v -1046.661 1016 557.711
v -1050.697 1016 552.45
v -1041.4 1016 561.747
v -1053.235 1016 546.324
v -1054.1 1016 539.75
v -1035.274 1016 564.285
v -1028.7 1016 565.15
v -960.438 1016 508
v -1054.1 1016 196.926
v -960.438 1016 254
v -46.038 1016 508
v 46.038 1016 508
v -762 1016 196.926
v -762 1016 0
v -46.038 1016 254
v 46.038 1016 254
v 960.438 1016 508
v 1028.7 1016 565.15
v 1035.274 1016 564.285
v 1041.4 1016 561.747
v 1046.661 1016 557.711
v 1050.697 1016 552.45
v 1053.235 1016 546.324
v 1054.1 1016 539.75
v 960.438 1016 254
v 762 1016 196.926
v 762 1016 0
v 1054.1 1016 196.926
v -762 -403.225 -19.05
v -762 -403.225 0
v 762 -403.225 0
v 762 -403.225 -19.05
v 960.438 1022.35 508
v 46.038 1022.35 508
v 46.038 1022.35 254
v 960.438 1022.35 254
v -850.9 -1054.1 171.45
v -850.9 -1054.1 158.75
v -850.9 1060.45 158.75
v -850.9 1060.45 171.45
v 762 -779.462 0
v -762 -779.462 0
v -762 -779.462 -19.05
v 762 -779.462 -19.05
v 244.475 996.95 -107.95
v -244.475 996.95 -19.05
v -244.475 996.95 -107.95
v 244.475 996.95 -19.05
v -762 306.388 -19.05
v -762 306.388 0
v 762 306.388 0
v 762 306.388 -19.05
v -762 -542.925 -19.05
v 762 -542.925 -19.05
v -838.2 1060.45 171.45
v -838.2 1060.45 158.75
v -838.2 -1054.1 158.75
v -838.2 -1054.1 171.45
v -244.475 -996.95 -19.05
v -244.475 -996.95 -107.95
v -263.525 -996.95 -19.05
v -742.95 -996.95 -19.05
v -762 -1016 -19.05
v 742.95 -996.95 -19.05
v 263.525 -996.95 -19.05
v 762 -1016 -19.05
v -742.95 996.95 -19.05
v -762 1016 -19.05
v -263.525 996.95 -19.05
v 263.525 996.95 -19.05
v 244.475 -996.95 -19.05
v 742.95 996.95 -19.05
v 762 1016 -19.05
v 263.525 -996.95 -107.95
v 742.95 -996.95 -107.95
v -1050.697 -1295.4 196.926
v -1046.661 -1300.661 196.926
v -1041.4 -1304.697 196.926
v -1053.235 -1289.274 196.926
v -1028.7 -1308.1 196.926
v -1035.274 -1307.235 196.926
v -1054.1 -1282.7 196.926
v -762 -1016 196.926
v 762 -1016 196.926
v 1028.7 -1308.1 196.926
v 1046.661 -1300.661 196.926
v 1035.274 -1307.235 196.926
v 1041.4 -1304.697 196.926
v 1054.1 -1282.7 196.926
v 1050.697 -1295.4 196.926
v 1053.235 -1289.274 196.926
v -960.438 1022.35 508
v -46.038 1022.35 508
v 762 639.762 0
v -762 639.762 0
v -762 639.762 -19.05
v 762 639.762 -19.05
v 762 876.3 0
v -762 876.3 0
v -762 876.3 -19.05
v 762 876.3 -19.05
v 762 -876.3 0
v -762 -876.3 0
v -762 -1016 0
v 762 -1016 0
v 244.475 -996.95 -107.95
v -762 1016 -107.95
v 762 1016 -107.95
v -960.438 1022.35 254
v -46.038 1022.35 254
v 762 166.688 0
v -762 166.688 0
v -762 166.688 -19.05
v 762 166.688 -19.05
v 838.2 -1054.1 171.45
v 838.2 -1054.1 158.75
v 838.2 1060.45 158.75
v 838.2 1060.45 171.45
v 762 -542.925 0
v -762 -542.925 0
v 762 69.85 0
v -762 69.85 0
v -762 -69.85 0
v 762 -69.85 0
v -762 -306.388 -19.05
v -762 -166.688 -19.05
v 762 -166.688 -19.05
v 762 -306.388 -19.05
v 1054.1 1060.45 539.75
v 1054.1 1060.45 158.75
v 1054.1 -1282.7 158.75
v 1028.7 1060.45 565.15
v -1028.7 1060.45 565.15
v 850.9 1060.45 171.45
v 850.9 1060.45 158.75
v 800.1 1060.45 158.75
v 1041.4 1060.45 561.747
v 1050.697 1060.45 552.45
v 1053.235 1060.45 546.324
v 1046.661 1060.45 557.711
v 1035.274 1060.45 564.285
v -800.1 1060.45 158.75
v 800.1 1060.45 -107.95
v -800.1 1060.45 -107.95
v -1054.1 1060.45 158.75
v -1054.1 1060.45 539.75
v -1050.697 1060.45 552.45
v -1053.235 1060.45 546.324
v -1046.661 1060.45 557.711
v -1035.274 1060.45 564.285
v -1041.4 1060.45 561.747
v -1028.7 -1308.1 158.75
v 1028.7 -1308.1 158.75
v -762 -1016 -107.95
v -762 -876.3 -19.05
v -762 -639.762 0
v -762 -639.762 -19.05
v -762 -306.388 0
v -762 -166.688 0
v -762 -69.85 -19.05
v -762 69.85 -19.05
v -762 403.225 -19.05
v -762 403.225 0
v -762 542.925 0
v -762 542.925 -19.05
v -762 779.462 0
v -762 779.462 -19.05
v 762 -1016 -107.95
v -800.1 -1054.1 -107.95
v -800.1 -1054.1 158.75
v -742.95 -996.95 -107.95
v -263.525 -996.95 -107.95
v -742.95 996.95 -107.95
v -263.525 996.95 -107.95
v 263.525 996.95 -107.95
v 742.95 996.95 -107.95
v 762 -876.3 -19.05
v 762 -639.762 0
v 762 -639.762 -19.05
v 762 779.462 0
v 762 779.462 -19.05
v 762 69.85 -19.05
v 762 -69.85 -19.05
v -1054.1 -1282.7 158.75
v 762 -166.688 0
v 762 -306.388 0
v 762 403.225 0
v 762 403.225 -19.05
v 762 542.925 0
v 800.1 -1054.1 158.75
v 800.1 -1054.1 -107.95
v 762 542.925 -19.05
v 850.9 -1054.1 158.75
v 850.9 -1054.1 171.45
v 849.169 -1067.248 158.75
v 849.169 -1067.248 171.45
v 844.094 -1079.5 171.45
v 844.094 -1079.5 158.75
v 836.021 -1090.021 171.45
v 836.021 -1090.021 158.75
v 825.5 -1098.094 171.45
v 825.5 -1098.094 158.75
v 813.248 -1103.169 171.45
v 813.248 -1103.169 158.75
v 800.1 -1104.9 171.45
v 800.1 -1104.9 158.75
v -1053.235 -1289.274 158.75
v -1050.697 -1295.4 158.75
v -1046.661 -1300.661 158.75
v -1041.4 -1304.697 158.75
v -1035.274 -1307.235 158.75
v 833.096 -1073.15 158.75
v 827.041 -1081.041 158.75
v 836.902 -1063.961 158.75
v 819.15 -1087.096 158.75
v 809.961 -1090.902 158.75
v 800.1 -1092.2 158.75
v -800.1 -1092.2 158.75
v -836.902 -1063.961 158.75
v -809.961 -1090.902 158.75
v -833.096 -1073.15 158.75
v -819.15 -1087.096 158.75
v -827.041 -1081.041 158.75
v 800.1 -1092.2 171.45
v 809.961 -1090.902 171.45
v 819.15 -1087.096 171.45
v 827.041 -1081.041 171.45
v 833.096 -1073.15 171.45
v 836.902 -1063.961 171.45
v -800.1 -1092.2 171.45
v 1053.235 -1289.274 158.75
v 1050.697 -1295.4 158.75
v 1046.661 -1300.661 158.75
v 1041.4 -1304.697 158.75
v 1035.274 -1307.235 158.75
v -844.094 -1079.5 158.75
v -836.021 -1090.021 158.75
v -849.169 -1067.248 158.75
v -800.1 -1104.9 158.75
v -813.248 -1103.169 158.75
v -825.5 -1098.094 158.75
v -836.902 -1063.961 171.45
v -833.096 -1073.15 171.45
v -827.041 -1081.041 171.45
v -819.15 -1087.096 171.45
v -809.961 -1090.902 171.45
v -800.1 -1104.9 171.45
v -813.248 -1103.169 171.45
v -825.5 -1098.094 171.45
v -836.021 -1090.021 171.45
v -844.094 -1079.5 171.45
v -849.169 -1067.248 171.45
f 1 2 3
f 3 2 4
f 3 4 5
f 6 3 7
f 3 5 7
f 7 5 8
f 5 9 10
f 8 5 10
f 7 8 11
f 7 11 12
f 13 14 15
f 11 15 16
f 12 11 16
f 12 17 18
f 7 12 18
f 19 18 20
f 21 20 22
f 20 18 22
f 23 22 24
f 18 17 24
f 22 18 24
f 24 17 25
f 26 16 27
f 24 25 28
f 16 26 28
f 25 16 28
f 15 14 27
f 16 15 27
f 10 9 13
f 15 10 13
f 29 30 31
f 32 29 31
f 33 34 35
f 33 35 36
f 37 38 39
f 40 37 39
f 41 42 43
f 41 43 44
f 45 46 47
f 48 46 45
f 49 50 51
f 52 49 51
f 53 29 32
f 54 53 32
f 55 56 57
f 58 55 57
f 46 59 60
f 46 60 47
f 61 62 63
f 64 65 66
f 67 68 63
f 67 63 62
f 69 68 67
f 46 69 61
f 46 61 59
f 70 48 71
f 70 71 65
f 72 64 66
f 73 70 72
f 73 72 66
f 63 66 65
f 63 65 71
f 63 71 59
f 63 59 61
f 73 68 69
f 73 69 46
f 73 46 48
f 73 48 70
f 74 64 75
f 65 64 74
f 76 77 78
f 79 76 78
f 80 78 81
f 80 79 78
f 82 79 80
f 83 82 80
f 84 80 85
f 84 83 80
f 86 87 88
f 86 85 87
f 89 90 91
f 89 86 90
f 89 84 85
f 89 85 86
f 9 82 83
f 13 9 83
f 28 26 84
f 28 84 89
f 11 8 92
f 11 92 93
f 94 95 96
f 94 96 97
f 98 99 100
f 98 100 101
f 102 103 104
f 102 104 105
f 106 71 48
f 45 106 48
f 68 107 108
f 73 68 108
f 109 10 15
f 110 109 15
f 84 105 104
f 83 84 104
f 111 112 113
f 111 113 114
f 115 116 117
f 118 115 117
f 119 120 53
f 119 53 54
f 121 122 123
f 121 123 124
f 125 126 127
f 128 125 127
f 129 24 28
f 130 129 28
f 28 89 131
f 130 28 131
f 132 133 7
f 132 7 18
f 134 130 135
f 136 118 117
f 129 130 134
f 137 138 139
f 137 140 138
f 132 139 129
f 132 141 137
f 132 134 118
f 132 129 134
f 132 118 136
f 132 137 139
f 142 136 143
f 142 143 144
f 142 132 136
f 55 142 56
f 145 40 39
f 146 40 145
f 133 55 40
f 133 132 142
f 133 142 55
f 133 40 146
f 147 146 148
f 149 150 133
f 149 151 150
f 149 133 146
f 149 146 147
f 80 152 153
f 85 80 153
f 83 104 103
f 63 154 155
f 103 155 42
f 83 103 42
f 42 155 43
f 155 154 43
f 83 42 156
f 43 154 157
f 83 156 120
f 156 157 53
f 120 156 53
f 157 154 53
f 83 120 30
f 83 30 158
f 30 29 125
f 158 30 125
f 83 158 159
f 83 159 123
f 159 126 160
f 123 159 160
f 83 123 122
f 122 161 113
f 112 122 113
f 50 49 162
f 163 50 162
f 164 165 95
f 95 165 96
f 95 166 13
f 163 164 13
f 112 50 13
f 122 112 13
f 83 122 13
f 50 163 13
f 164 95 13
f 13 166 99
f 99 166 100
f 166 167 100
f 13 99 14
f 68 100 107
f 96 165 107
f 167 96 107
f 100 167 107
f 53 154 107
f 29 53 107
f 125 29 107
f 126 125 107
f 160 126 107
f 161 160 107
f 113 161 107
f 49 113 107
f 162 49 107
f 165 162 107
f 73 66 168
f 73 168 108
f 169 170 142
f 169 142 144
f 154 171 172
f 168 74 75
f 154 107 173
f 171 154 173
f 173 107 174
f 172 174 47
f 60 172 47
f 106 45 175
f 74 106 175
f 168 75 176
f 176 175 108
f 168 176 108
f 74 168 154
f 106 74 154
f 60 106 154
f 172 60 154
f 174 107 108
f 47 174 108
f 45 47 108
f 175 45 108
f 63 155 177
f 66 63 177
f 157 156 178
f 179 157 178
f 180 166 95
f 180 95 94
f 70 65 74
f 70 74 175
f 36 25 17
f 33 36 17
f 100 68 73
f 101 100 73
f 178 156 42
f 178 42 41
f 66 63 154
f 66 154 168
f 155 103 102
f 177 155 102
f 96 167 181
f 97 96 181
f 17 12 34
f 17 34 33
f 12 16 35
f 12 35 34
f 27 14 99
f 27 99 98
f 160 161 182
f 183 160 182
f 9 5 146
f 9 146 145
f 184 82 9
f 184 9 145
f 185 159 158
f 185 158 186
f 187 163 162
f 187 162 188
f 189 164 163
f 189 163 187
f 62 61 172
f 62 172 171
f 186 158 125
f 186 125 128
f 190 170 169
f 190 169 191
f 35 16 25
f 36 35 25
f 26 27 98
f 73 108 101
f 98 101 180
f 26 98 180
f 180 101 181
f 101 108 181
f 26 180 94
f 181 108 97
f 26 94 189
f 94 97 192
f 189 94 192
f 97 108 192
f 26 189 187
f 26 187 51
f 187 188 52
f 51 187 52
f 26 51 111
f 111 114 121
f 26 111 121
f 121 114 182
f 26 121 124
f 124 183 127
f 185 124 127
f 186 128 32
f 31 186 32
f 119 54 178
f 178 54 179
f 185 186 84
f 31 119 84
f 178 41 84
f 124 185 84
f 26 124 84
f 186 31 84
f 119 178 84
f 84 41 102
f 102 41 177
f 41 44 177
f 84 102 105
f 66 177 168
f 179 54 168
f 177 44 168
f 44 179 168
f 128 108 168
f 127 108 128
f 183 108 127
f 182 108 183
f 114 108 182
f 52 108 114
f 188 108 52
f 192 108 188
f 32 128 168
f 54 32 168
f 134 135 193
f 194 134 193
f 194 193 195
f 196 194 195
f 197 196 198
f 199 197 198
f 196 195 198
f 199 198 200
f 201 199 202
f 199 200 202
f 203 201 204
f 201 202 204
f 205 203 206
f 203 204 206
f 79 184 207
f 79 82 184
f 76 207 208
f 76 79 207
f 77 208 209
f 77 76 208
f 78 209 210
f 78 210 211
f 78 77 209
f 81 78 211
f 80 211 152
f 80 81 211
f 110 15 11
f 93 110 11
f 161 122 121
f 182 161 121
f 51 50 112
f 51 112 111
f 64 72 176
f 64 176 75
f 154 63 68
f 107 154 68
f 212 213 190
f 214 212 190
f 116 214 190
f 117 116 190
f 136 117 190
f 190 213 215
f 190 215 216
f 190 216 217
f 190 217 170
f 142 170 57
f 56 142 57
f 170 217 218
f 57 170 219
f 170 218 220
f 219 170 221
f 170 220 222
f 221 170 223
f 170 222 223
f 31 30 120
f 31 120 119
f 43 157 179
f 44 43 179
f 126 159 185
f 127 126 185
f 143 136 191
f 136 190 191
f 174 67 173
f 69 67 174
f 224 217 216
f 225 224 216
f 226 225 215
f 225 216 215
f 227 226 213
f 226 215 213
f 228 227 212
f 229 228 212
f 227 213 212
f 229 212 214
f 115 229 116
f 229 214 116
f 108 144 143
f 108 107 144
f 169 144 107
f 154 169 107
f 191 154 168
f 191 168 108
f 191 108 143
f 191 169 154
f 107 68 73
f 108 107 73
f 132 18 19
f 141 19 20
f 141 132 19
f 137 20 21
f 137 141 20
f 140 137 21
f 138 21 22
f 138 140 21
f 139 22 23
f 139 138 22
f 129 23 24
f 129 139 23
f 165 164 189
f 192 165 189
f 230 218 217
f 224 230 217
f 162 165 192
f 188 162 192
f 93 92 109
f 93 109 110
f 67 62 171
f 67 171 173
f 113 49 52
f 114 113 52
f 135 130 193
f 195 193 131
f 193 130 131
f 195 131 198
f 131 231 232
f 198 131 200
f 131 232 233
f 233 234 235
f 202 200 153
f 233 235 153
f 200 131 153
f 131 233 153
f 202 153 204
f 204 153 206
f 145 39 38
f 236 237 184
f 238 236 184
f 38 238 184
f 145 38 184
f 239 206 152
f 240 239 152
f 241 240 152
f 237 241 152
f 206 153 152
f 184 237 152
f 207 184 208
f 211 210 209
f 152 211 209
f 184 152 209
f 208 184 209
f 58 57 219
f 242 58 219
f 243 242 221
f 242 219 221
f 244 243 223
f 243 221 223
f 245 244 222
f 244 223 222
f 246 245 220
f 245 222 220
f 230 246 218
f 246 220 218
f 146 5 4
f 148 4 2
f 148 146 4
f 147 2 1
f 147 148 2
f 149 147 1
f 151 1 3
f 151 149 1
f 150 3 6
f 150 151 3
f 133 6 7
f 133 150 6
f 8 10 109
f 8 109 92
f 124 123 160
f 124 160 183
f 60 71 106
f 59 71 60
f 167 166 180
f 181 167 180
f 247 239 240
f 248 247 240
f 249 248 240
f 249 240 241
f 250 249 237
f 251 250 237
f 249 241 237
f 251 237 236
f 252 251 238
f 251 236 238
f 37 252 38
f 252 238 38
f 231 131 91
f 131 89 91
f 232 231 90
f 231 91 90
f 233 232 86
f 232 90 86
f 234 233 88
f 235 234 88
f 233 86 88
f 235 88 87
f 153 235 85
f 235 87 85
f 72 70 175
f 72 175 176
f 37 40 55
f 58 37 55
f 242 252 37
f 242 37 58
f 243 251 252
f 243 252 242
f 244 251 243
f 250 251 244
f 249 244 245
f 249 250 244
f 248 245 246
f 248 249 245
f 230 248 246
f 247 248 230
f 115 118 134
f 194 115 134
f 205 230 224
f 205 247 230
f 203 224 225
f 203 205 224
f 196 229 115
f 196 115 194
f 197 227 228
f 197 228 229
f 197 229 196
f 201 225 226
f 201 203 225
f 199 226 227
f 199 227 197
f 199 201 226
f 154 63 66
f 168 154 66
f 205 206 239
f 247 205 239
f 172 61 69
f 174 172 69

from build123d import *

# Parameters (mm, degrees)
F0_W          = 1600.2
F0_H          = 2108.2
F0_W_2        = 1524
F0_H_2        = 2032
F1_DEPTH      = 196.85
F1_DEPTH_BACK = 107.95
F2_W          = 1524
F2_H          = 2032
F2_W_2        = 19.05
F2_H_2        = 1993.9
F3_DEPTH      = 107.95
F4_DEPTH      = 19.05
F5_W          = 1524
F5_H          = 139.7
F6_DEPTH      = 19.05
F7_W          = 254
F7_H          = 38.1
F8_DEPTH      = 368.3
F10_DEPTH     = 196.9262
F11_DEPTH     = 158.75
F12_DEPTH     = 38.1
F13_R         = 25.4
F14_R         = 25.4
F15_W         = 914.4
F15_H         = 254
F16_DEPTH     = 44.45
F17_DEPTH     = 6.35
F18_DEPTH     = 6.35
F20_DEPTH     = 12.7


with BuildPart() as f1:
    # F0 (on Top) → F1 (new body, two sides)
    with BuildSketch(Plane.XY) as f1_sk:
        Rectangle(F0_W, F0_H)
        Rectangle(F0_W_2, F0_H_2, mode=Mode.SUBTRACT)
    extrude(amount=F1_DEPTH)
    extrude(f1_sk.sketch, amount=-F1_DEPTH_BACK)

    # F7 (on face) → F8 (join)
    with BuildSketch(Plane.XY.offset(196.85)):
        with Locations((927.1, 1035.05)):
            Rectangle(F7_W, F7_H)
        with Locations((-927.1, 1035.05)):
            Rectangle(F7_W, F7_H)
        Polygon((800.1, 1054.1), (-800.1, 1054.1), (-800.1, 1016), (-762, 1016), (762, 1016), (800.1, 1016), align=None)
    extrude(amount=F8_DEPTH)



with BuildPart() as f3:
    # F2 (on Top) → F3 (new body)
    with BuildSketch(Plane.XY):
        Rectangle(F2_W, F2_H)
        Polygon((742.95, 996.95), (742.95, -996.95), (263.525, -996.95), (244.475, -996.95), (-244.475, -996.95), (-263.525, -996.95), (-742.95, -996.95), (-742.95, 996.95), (-263.525, 996.95), (-244.475, 996.95), (244.475, 996.95), (263.525, 996.95), align=None, mode=Mode.SUBTRACT)
        with Locations((-254, 0)):
            Rectangle(F2_W_2, F2_H_2)
        with Locations((254, 0)):
            Rectangle(F2_W_2, F2_H_2)
    extrude(amount=-F3_DEPTH)

    # F4 (cut): a face of the model
    f4_faces = [f3.faces().sort_by_distance(p)[0] for p in [
        (0, -1013.46, 0),
    ]]
    extrude(f4_faces, amount=-F4_DEPTH, mode=Mode.SUBTRACT)


with BuildPart() as f6:
    # F5 (on Top) → F6 (new body)
    with BuildSketch(Plane.XY):
        with Locations((0, 946.15)):
            Rectangle(F5_W, F5_H)
    extrude(amount=-F6_DEPTH)


with BuildPart() as f6b:
    # F5 (on Top) → F6, piece 2 (new body)
    with BuildSketch(Plane.XY):
        with Locations((0, 709.6125)):
            Rectangle(F5_W, F5_H)
    extrude(amount=-F6_DEPTH)


with BuildPart() as f6c:
    # F5 (on Top) → F6, piece 3 (new body)
    with BuildSketch(Plane.XY):
        with Locations((0, 473.075)):
            Rectangle(F5_W, F5_H)
    extrude(amount=-F6_DEPTH)


with BuildPart() as f6d:
    # F5 (on Top) → F6, piece 4 (new body)
    with BuildSketch(Plane.XY):
        with Locations((0, 236.5375)):
            Rectangle(F5_W, F5_H)
    extrude(amount=-F6_DEPTH)


with BuildPart() as f6e:
    # F5 (on Top) → F6, piece 5 (new body)
    with BuildSketch(Plane.XY):
        Rectangle(F5_W, F5_H)
    extrude(amount=-F6_DEPTH)


with BuildPart() as f6f:
    # F5 (on Top) → F6, piece 6 (new body)
    with BuildSketch(Plane.XY):
        with Locations((0, -236.5375)):
            Rectangle(F5_W, F5_H)
    extrude(amount=-F6_DEPTH)


with BuildPart() as f6g:
    # F5 (on Top) → F6, piece 7 (new body)
    with BuildSketch(Plane.XY):
        with Locations((0, -473.075)):
            Rectangle(F5_W, F5_H)
    extrude(amount=-F6_DEPTH)


with BuildPart() as f6h:
    # F5 (on Top) → F6, piece 8 (new body)
    with BuildSketch(Plane.XY):
        with Locations((0, -709.6125)):
            Rectangle(F5_W, F5_H)
    extrude(amount=-F6_DEPTH)


with BuildPart() as f6i:
    # F5 (on Top) → F6, piece 9 (new body)
    with BuildSketch(Plane.XY):
        with Locations((0, -946.15)):
            Rectangle(F5_W, F5_H)
    extrude(amount=-F6_DEPTH)


with BuildPart() as f1_1:
    add(f1.part)

    add(f6.part)  # F10 merges F6

    add(f6b.part)  # F10 merges F6b

    add(f6c.part)  # F10 merges F6c

    add(f6d.part)  # F10 merges F6d

    add(f6e.part)  # F10 merges F6e

    add(f6f.part)  # F10 merges F6f

    add(f6g.part)  # F10 merges F6g

    add(f6h.part)  # F10 merges F6h

    add(f6i.part)  # F10 merges F6i
    # F9 (on Top) → F10 (join)
    with BuildSketch(Plane.XY):
        Polygon((762, 1016), (762, -1016), (-762, -1016), (-762, 1016), (-1054.1, 1016), (-1054.1, -1308.1), (1054.1, -1308.1), (1054.1, 1016), align=None)
    extrude(amount=F10_DEPTH)

    # F11 (cut): a face of the model
    f11_faces = [f1_1.faces().sort_by_distance(p)[0] for p in [
        (927.1, 984.6217463042, 0),
    ]]
    extrude(f11_faces, amount=-F11_DEPTH, mode=Mode.SUBTRACT)

    # F12 (add): faces of the model
    f12_faces = [f1_1.faces().sort_by_distance(p)[0] for p in [
        (-927.1, 1035.05, 196.85),
        (927.1, 1035.05, 196.85),
    ]]
    extrude(f12_faces, amount=F12_DEPTH)

    # F13
    f13_edges = [f1_1.edges().sort_by_distance(p)[0] for p in [
        (-1054.1, -1308.1, 177.8381),
        (1054.1, -1308.1, 177.8381),
    ]]
    fillet(f13_edges, radius=F13_R)

    # F14
    f14_edges = [f1_1.edges().sort_by_distance(p)[0] for p in [
        (-1054.1, 1035.05, 565.15),
        (1054.1, 1035.05, 565.15),
    ]]
    fillet(f14_edges, radius=F14_R)

    # F15 (on face) → F16 (join)
    with BuildSketch(Plane.XZ.offset(-1016)):
        with BuildLine():
            Line((762, 196.9262), (1054.1, 196.9262))
            Line((1054.1, 196.9262), (1054.1, 539.75))
            ThreePointArc((1054.1, 539.75), (1046.6605122421, 557.7105122421), (1028.7, 565.15))
            Line((1028.7, 565.15), (-1028.7, 565.15))
            ThreePointArc((-1028.7, 565.15), (-1046.6605122421, 557.7105122421), (-1054.1, 539.75))
            Line((-1054.1, 539.75), (-1054.1, 196.9262))
            Line((-1054.1, 196.9262), (-762, 196.9262))
            Line((-762, 196.9262), (-762, 0))
            Line((-762, 0), (762, 0))
            Line((762, 0), (762, 196.9262))
        make_face()
        with Locations((-503.2375, 381)):
            Rectangle(F15_W, F15_H, mode=Mode.SUBTRACT)
        with Locations((503.2375, 381)):
            Rectangle(F15_W, F15_H, mode=Mode.SUBTRACT)
        with Locations((503.2375, 381)):
            Rectangle(F15_W, F15_H)
        with Locations((-503.2375, 381)):
            Rectangle(F15_W, F15_H)
    extrude(amount=-F16_DEPTH)

    # F15 (on face) → F17 (cut)
    with BuildSketch(Plane.XZ.offset(-1016)):
        with Locations((-503.2375, 381)):
            Rectangle(F15_W, F15_H)
        with Locations((503.2375, 381)):
            Rectangle(F15_W, F15_H)
    extrude(amount=-F17_DEPTH, mode=Mode.SUBTRACT)

    # F18 (add): a face of the model
    f18_faces = [f1_1.faces().sort_by_distance(p)[0] for p in [
        (0, 1054.1, -21.2285823954),
    ]]
    extrude(f18_faces, amount=F18_DEPTH)

    # F19 (on face) → F20 (cut)
    with BuildSketch(Plane(origin=(0, 0, 158.75), x_dir=(1, 0, 0), z_dir=(0, 0, -1))):
        with BuildLine():
            Line((-850.9, -1060.45), (-838.2, -1060.45))
            Line((-838.2, -1060.45), (-838.2, 1054.1))
            ThreePointArc((-838.2, 1054.1), (-827.0407683632, 1081.0407683632), (-800.1, 1092.2))
            Line((-800.1, 1092.2), (800.1, 1092.2))
            ThreePointArc((800.1, 1092.2), (827.0407683632, 1081.0407683632), (838.2, 1054.1))
            Line((838.2, 1054.1), (838.2, -1060.45))
            Line((838.2, -1060.45), (850.9, -1060.45))
            Line((850.9, -1060.45), (850.9, 1054.1))
            ThreePointArc((850.9, 1054.1), (836.0210244843, 1090.0210244843), (800.1, 1104.9))
            Line((800.1, 1104.9), (-800.1, 1104.9))
            ThreePointArc((-800.1, 1104.9), (-836.0210244843, 1090.0210244843), (-850.9, 1054.1))
            Line((-850.9, 1054.1), (-850.9, -1060.45))
        make_face()
    extrude(amount=-F20_DEPTH, mode=Mode.SUBTRACT)


solid = Compound([f3.part, f1_1.part])
